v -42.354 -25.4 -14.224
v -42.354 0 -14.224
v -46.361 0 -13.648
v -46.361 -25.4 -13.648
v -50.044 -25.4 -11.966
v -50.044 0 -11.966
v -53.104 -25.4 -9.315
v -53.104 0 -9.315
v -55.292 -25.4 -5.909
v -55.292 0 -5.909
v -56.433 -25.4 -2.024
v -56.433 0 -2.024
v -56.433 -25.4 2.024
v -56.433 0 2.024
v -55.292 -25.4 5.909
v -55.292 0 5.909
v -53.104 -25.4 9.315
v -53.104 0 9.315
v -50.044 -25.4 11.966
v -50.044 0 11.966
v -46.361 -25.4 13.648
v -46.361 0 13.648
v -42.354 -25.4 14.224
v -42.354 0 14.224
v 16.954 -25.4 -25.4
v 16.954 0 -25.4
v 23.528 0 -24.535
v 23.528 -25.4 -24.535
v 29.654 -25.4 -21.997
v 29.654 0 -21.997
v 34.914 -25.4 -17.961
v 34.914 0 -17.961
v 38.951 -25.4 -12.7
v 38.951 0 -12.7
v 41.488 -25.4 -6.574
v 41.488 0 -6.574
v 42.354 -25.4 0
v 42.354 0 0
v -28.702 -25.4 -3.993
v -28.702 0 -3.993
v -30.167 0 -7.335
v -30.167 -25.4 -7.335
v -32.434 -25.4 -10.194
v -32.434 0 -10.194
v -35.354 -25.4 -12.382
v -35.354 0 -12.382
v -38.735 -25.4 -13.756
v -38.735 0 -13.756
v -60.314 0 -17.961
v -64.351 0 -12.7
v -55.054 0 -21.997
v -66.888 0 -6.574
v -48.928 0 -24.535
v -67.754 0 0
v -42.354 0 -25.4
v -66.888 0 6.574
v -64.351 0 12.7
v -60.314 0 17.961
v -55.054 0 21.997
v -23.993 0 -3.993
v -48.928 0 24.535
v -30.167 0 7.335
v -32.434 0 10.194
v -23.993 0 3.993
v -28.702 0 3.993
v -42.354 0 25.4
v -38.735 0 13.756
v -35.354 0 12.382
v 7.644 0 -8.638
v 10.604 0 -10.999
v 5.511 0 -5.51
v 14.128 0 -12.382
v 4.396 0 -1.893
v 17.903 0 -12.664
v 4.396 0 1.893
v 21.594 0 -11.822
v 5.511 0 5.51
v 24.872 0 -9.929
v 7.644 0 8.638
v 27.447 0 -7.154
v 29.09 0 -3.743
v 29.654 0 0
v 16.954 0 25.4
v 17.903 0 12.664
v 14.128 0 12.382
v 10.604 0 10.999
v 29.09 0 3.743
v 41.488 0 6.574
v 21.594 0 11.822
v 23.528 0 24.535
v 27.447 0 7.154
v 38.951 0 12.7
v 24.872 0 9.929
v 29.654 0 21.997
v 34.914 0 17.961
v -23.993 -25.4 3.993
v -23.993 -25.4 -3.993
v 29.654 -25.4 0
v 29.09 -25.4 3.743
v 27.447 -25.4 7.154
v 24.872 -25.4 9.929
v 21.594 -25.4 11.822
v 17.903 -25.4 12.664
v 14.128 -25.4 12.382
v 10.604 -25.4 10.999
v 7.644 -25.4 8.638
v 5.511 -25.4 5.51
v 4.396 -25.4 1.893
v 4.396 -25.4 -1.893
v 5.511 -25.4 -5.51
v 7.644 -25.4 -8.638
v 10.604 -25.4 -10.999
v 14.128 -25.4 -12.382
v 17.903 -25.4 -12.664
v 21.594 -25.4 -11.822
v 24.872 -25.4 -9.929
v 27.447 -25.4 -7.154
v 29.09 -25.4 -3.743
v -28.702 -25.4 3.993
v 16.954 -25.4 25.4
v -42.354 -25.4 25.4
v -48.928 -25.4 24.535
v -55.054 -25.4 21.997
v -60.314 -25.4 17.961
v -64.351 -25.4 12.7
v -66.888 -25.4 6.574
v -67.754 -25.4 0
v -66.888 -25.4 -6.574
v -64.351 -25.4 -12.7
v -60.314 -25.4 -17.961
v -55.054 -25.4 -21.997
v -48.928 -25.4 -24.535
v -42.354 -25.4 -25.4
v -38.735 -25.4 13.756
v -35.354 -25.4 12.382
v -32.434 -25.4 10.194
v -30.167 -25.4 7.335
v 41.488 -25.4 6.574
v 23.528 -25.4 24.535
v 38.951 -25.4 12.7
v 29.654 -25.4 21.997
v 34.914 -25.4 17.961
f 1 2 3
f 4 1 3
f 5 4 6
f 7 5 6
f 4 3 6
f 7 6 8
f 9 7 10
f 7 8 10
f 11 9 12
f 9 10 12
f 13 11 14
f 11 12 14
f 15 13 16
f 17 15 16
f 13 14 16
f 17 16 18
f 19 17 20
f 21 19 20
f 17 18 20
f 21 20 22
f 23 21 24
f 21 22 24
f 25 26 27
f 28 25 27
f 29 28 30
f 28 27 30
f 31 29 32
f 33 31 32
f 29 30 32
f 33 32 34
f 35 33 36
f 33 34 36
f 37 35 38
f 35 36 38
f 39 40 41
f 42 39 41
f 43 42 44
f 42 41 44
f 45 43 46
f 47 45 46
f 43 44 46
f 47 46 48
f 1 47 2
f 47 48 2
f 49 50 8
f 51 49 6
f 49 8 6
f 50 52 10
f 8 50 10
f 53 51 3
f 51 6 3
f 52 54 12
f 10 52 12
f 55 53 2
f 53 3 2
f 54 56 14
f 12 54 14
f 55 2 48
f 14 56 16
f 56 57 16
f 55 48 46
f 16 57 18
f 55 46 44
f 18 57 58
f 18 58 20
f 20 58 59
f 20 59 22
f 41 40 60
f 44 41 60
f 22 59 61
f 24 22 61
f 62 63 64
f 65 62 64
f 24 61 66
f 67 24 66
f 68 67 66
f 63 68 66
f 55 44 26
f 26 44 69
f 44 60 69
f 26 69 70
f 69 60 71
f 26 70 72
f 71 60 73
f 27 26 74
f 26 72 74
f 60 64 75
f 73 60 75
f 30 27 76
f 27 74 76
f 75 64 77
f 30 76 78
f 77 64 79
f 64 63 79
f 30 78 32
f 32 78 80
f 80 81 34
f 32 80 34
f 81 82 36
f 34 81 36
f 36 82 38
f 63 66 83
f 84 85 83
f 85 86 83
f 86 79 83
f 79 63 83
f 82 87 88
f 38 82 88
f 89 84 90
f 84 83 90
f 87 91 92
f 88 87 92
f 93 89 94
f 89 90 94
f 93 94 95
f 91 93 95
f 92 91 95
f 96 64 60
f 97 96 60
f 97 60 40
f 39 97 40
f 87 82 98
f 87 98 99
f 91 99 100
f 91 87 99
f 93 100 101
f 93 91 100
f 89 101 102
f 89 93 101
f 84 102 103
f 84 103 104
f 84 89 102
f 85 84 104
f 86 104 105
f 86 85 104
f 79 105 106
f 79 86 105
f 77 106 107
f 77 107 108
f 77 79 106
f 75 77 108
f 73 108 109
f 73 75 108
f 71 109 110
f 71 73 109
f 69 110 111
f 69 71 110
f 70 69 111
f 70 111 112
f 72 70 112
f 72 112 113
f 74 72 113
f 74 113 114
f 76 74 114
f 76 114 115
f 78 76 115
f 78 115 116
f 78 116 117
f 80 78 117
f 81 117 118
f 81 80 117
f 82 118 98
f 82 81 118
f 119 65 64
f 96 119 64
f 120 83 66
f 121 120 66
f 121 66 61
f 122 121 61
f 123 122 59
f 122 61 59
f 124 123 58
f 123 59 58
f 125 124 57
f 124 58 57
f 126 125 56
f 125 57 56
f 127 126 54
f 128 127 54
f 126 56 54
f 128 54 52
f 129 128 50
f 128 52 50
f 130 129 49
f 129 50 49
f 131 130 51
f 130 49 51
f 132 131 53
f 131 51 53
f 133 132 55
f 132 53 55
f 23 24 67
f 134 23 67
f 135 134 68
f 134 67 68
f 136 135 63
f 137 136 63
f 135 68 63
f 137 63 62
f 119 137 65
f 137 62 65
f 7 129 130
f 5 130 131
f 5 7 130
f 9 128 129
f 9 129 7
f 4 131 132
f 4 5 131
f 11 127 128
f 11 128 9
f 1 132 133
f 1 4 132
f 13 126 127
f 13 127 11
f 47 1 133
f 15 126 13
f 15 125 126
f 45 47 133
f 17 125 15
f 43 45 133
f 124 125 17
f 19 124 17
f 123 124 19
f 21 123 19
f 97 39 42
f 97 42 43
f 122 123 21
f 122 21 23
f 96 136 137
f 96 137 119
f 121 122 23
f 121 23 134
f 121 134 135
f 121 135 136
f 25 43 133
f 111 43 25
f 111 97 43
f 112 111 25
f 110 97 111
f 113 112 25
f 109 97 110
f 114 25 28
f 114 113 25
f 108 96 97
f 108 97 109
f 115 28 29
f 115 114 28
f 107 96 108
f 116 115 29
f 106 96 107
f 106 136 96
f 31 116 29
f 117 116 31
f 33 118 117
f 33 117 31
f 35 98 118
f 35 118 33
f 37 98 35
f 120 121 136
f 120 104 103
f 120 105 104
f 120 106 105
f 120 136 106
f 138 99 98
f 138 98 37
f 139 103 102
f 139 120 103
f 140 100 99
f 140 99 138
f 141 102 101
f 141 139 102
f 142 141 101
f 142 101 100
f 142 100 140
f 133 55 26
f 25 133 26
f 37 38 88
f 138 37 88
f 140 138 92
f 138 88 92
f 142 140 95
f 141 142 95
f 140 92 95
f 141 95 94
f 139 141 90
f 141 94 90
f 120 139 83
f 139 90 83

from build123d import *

# Parameters (mm, degrees)
F0_R     = 12.7
F1_DEPTH = 25.4


with BuildPart() as f1:
    # F0 (on Front) → F1 (new body)
    with BuildSketch(Plane.XZ):
        with BuildLine():
            Line((16.9537905604, 25.4), (-42.3537905604, 25.4))
            ThreePointArc((-42.3537905604, 25.4), (-24.3932783182, 17.9605122421), (-16.9537905604, 0))
            ThreePointArc((-16.9537905604, 0), (-24.3932783182, -17.9605122421), (-42.3537905604, -25.4))
            Line((-42.3537905604, -25.4), (16.9537905604, -25.4))
            ThreePointArc((16.9537905604, -25.4), (34.9143028025, -17.9605122421), (42.3537905604, 0))
            ThreePointArc((42.3537905604, 0), (34.9143028025, 17.9605122421), (16.9537905604, 25.4))
        make_face()
        with Locations((16.9537905604, 0)):
            Circle(F0_R, mode=Mode.SUBTRACT)
        with BuildLine():
            Line((-42.3537905604, 14.224), (-42.3537905604, 25.4))
            ThreePointArc((-42.3537905604, 25.4), (-67.7537905604, 0), (-42.3537905604, -25.4))
            Line((-42.3537905604, -25.4), (-42.3537905604, -14.224))
            ThreePointArc((-42.3537905604, -14.224), (-56.5777905604, 0), (-42.3537905604, 14.224))
        make_face()
        with BuildLine():
            ThreePointArc((-16.9537905604, 0), (-24.3932783182, 17.9605122421), (-42.3537905604, 25.4))
            Line((-42.3537905604, 25.4), (-42.3537905604, 14.224))
            ThreePointArc((-42.3537905604, 14.224), (-33.8234800273, 11.3822659523), (-28.7016163276, 3.9925323692))
            Line((-28.7016163276, 3.9925323692), (-23.993383965, 3.9925323692))
            Line((-23.993383965, 3.9925323692), (-23.993383965, -3.9925323692))
            Line((-23.993383965, -3.9925323692), (-28.7016163276, -3.9925323692))
            ThreePointArc((-28.7016163276, -3.9925323692), (-33.8234800273, -11.3822659523), (-42.3537905604, -14.224))
            Line((-42.3537905604, -14.224), (-42.3537905604, -25.4))
            ThreePointArc((-42.3537905604, -25.4), (-24.3932783182, -17.9605122421), (-16.9537905604, 0))
        make_face()
    extrude(amount=F1_DEPTH)


solid = f1.part
